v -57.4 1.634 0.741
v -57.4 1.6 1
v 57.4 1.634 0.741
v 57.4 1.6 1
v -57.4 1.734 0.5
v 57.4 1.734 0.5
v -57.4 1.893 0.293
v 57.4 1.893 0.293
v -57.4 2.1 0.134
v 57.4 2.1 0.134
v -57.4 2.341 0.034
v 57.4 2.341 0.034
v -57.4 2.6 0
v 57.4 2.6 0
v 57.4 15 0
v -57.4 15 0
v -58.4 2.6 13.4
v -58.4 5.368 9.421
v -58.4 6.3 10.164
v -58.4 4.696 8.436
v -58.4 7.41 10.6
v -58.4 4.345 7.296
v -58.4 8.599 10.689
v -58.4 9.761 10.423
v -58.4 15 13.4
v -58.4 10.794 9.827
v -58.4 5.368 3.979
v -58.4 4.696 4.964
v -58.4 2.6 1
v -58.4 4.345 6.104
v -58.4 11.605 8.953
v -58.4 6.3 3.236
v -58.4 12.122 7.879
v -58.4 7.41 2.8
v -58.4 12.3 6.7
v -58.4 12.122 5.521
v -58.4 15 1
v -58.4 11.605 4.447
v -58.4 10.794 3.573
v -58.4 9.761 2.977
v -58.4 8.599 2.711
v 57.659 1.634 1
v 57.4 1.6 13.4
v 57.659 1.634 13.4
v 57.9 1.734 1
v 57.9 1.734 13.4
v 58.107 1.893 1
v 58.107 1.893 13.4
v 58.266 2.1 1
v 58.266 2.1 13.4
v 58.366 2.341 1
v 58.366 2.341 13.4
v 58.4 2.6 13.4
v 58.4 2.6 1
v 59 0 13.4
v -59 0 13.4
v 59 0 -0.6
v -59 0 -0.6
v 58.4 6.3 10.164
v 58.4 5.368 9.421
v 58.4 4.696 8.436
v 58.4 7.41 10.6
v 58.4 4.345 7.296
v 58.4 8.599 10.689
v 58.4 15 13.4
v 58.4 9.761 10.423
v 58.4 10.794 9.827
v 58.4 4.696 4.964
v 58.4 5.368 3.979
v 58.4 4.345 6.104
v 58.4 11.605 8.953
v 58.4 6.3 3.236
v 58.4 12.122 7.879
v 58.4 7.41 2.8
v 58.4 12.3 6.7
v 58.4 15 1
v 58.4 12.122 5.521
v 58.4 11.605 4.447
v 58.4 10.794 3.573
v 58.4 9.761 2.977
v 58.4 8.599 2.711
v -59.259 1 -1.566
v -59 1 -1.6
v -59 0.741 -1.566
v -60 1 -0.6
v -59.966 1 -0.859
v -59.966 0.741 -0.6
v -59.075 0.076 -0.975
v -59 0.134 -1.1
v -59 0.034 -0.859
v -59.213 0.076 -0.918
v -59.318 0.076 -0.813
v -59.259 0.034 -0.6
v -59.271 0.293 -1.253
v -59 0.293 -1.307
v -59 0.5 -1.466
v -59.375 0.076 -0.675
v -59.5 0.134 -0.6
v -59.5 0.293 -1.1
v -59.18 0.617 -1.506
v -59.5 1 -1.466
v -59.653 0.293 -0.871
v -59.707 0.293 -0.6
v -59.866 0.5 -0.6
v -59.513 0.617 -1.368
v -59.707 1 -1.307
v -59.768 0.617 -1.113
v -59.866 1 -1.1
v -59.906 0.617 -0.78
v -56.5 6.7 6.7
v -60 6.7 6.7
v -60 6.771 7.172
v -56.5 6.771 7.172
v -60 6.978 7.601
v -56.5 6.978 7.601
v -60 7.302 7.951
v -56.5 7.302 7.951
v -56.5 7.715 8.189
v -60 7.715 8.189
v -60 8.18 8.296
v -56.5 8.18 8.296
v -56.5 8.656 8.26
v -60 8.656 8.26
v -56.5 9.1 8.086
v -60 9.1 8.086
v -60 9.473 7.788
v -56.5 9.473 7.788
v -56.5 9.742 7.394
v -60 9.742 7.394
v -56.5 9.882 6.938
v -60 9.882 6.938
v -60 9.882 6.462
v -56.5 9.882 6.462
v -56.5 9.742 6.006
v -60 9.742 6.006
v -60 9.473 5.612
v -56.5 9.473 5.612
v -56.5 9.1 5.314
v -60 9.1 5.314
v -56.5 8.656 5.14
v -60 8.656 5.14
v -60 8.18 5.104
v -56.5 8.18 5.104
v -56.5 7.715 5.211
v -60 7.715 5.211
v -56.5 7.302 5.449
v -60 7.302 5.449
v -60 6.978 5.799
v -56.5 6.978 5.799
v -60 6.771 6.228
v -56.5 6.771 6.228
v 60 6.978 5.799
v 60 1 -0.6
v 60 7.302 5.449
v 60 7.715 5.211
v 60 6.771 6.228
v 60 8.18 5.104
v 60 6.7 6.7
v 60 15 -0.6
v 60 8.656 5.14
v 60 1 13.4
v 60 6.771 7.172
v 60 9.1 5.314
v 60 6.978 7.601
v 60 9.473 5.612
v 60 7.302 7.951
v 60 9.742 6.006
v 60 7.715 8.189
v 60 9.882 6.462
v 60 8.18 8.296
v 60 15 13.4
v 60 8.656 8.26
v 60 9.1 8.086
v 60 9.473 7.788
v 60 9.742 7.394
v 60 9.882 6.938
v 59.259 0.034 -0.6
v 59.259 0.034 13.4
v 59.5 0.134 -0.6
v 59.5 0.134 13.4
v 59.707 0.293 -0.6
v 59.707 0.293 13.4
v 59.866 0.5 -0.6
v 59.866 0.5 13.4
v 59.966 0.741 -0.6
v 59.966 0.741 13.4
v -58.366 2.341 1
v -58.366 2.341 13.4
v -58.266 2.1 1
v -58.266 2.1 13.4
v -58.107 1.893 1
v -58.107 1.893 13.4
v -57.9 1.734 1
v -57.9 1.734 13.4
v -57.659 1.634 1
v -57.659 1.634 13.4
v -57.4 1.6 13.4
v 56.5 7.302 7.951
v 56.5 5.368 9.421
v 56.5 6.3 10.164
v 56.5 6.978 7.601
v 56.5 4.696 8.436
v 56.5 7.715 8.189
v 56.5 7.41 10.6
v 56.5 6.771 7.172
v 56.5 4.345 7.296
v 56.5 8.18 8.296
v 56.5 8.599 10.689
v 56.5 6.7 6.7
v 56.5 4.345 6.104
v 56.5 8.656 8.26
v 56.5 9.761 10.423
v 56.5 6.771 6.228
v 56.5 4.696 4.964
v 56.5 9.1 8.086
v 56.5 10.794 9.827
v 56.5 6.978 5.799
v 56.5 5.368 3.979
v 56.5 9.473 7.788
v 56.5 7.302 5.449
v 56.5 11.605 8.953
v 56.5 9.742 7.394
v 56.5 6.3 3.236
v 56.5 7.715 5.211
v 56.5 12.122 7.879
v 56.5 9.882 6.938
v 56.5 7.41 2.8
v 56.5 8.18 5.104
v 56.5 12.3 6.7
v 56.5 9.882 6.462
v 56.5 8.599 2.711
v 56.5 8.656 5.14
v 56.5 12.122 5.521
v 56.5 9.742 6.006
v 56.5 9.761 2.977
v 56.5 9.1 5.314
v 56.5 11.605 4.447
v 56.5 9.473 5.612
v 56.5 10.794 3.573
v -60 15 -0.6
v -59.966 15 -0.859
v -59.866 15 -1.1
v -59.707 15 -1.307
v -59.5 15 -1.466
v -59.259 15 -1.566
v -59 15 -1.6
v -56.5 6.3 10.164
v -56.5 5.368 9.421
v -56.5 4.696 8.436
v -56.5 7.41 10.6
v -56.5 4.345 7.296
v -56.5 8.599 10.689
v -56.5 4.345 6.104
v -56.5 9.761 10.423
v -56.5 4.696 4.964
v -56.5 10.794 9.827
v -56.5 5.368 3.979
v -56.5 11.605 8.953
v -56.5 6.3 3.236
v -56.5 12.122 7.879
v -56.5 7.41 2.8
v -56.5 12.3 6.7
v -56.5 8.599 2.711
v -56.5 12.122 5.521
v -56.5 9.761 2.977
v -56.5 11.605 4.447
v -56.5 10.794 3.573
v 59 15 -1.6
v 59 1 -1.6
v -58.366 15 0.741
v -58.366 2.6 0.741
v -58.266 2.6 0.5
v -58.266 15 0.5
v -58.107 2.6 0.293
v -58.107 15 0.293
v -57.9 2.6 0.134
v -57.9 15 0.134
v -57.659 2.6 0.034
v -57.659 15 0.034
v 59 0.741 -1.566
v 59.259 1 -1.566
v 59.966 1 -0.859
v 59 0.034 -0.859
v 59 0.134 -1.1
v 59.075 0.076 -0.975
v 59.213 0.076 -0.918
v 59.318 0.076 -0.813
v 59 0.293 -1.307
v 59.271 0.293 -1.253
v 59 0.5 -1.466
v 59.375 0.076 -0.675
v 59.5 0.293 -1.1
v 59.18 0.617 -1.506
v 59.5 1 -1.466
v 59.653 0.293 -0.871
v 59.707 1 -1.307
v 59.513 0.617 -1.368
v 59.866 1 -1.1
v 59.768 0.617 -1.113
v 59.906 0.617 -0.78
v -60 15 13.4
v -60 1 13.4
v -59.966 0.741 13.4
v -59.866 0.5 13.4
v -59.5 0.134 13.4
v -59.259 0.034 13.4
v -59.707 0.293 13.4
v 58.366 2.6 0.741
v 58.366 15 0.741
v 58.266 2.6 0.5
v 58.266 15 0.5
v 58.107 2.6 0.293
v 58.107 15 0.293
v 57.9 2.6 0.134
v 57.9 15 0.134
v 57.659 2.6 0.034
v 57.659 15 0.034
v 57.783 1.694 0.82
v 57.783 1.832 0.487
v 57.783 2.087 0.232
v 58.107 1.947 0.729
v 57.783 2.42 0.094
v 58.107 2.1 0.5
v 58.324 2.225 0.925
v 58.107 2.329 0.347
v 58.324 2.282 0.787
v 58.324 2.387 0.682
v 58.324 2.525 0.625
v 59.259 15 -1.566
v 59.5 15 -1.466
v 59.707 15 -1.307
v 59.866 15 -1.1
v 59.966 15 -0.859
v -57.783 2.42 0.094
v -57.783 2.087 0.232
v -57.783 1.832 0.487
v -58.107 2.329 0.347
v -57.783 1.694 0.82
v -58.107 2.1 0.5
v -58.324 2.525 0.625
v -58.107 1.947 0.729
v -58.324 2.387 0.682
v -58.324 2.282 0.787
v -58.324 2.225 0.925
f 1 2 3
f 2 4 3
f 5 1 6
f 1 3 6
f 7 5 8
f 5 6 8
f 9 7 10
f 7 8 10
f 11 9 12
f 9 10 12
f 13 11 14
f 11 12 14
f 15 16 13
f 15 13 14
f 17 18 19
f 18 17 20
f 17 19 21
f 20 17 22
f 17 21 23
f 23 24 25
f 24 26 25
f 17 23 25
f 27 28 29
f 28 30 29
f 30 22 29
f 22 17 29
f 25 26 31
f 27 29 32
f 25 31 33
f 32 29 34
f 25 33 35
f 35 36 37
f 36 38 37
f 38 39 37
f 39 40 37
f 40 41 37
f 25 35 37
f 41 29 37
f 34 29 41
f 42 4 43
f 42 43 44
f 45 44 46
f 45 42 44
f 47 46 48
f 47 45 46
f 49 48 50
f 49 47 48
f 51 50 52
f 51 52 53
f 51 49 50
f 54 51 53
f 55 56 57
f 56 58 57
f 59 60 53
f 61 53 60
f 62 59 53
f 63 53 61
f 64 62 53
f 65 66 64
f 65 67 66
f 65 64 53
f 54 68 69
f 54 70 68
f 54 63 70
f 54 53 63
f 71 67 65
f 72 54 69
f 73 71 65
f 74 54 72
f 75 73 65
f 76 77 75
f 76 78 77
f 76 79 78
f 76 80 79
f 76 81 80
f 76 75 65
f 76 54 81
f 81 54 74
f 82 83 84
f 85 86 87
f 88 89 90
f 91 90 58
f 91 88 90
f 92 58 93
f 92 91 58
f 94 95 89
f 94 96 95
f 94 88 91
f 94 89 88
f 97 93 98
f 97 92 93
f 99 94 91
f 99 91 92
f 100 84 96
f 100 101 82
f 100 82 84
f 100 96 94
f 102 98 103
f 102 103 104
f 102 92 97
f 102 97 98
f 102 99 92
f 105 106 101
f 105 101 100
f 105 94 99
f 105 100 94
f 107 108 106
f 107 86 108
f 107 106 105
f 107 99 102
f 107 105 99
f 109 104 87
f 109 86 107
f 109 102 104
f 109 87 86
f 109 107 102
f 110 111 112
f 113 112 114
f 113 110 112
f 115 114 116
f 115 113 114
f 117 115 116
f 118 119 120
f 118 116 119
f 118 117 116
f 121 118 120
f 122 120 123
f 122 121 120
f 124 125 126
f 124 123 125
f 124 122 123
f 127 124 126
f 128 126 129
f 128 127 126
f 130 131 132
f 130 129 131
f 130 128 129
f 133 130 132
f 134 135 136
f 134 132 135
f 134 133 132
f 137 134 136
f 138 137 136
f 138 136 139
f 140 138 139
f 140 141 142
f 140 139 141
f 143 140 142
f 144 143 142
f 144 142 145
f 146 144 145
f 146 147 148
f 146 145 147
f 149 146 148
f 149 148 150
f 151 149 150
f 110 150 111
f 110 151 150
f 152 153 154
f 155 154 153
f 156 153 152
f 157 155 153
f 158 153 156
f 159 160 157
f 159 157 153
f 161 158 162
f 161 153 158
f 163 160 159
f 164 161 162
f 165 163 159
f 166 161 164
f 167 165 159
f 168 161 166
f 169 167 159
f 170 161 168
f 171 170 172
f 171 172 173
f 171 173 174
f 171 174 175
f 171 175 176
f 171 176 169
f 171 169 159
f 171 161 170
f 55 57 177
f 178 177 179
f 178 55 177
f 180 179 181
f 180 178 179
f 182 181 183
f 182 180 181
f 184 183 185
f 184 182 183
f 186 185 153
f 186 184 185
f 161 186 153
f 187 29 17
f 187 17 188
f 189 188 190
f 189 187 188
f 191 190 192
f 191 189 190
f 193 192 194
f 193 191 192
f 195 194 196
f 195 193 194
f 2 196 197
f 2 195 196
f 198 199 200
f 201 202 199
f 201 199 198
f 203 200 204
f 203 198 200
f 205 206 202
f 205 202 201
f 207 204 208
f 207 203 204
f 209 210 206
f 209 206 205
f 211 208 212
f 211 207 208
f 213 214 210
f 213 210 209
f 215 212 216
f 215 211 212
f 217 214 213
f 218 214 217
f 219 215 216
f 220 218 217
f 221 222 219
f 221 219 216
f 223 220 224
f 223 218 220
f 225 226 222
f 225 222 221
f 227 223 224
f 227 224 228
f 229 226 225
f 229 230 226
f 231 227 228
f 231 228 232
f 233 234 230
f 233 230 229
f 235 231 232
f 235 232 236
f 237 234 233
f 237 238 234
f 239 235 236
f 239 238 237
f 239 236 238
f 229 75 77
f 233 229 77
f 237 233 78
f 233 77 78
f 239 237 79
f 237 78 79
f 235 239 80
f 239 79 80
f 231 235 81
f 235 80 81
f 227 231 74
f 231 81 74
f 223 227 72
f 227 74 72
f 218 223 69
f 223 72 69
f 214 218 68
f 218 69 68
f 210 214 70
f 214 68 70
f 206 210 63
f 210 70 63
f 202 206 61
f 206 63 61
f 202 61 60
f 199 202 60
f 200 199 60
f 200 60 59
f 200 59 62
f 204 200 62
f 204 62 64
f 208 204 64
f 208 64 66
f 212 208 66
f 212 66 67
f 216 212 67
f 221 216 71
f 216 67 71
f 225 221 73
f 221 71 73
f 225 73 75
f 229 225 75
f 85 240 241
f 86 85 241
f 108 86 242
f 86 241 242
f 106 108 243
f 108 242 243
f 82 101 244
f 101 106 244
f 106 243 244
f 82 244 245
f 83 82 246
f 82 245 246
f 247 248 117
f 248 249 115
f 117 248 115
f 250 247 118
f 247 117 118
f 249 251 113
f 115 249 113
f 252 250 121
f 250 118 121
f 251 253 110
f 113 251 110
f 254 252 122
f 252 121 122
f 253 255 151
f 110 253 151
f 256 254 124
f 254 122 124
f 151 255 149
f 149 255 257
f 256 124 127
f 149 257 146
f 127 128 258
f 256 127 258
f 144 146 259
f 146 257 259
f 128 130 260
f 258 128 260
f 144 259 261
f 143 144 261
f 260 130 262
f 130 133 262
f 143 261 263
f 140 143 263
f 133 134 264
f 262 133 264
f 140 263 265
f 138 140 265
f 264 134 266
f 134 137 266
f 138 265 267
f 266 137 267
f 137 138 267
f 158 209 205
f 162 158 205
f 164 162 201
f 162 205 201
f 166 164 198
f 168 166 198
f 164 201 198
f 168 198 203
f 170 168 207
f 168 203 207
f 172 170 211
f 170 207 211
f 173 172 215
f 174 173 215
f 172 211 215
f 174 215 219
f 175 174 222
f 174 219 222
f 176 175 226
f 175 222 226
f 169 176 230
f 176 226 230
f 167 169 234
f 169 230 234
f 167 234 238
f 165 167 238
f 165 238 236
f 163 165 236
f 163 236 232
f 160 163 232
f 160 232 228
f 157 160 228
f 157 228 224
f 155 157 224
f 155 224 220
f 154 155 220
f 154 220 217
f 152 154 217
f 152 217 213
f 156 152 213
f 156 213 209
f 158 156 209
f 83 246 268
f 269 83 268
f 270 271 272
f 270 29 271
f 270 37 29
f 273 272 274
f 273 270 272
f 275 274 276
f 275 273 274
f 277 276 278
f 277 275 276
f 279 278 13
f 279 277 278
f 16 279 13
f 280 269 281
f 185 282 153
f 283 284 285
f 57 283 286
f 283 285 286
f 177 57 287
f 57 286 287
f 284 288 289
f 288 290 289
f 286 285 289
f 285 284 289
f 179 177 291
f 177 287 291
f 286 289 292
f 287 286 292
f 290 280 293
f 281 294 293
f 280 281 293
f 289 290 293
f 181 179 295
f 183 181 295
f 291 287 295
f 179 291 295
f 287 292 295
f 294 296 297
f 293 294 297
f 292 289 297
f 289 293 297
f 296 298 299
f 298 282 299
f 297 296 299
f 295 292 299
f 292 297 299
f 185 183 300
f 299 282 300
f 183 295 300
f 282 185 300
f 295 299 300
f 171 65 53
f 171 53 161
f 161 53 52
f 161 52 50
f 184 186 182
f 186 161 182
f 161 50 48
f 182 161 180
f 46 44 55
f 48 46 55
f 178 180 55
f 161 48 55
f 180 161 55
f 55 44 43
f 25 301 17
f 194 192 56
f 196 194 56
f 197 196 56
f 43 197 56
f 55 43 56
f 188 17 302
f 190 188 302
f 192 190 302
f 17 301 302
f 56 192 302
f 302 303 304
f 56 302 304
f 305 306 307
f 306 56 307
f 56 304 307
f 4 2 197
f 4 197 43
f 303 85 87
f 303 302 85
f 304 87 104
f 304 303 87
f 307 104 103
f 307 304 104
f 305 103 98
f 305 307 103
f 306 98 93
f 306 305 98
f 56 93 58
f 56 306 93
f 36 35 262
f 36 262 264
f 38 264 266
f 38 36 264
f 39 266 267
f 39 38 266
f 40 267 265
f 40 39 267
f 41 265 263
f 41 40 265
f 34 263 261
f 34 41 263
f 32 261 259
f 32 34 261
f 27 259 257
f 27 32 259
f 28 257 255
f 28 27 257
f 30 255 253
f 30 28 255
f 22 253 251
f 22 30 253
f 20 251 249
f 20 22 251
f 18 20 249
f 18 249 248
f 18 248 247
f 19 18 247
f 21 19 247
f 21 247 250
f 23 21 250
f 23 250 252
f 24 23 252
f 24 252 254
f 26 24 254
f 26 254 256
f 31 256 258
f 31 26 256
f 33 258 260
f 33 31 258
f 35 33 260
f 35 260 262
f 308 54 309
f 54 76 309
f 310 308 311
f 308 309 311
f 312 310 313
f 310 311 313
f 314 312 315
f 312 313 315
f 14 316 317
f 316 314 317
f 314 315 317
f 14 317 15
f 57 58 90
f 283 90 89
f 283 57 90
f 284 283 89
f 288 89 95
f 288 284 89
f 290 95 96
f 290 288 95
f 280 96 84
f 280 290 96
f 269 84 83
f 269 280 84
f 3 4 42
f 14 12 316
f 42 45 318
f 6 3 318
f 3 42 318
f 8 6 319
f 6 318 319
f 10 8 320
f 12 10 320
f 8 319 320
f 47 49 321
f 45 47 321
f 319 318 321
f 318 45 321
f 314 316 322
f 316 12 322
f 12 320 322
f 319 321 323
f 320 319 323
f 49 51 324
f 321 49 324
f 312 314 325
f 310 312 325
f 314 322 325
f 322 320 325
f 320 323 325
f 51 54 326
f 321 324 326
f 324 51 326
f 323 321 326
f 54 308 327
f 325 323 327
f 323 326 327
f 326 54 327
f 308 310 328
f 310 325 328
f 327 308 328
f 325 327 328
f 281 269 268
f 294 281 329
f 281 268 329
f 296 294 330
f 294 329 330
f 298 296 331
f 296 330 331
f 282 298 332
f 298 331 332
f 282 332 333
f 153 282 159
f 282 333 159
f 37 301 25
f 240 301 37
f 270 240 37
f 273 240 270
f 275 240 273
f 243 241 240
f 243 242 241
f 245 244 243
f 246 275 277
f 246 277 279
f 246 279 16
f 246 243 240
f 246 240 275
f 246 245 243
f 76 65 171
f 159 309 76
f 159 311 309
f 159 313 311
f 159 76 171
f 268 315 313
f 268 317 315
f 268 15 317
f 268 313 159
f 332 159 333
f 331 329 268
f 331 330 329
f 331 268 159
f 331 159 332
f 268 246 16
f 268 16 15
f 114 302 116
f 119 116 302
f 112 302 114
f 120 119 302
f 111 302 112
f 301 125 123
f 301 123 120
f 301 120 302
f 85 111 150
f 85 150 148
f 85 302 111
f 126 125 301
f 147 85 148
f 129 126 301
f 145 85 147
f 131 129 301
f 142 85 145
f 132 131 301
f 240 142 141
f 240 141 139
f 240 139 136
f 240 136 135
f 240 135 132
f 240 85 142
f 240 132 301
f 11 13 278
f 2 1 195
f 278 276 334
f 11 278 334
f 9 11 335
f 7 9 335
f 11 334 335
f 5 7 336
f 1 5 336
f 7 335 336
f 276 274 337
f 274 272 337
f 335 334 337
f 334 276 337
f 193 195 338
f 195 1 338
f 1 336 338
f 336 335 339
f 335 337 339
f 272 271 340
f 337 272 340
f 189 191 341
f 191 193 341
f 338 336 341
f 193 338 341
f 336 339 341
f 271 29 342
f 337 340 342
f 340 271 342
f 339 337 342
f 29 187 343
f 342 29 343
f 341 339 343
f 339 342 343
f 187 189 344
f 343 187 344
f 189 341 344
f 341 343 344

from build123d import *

# Parameters (mm, degrees)
SKETCH_1_W             = 120
SKETCH_1_H             = 15
SM_BASE_FLANGE_1_DEPTH = 1.6
EXTRUDE_1_OUTLINE_W    = 116.8
EXTRUDE_1_OUTLINE_H    = 1.6
EXTRUDE_1_DEPTH        = 13.4
SKETCH_37_5_W          = 1.6
SKETCH_37_5_H          = 15
EXTRUDE_2_DEPTH        = 13.4
SKETCH_45_R            = 4
EXTRUDE_4_DEPTH        = 1.9
SKETCH_46_R            = 1.6
CUT_EXTRUDE_2_DEPTH    = 119.223559412
FILLET_3_R             = 1
FILLET_4_R             = 1


# Read off the part's stored shape, not the designer's step: 拉伸-薄壁1
# Sheet-metal steps are written as plain solids
with BuildPart() as part:
    # Sketch 1 → 基体-法兰1 (new body)
    with BuildSketch(Plane.XY):
        with Locations((0, 7.5)):
            Rectangle(SKETCH_1_W, SKETCH_1_H)
    extrude(amount=-SM_BASE_FLANGE_1_DEPTH)

    # 拉伸-薄壁1 outline → 拉伸-薄壁1 (add)
    with BuildSketch(Plane.XY):
        with Locations((0, 0.8)):
            Rectangle(EXTRUDE_1_OUTLINE_W, EXTRUDE_1_OUTLINE_H)
    extrude(amount=EXTRUDE_1_DEPTH)

    # 草图37<5> → 凸台-拉伸2 (add)
    with BuildSketch(Plane.XY):
        with Locations((-59.2, 7.5)):
            Rectangle(SKETCH_37_5_W, SKETCH_37_5_H)
        with Locations((59.2, 7.5)):
            Rectangle(SKETCH_37_5_W, SKETCH_37_5_H)
    extrude(amount=EXTRUDE_2_DEPTH)

    # 草图45 → 凸台-拉伸4 (add)
    with BuildSketch(Plane.ZY.offset(-58.4)):
        with Locations(Location((6.7, 8.3, 0), (0, 0, 90))):
            Circle(SKETCH_45_R)
    extrude_4 = extrude(amount=EXTRUDE_4_DEPTH)

    # 镜向1: 凸台-拉伸4 across plane
    add(extrude_4.mirror(Plane(origin=(0, 0, 0), x_dir=(0, 0, 1), z_dir=(1, 0, 0))))

    # 草图46 → 切除-拉伸2 (cut, through all)
    with BuildSketch(Plane.ZY.offset(-56.5)):
        with Locations(Location((6.7, 8.3, 0), (0, 0, 270))):
            Circle(SKETCH_46_R)
    cut_extrude_2 = extrude(amount=-CUT_EXTRUDE_2_DEPTH, mode=Mode.SUBTRACT)

    # 镜向2: 切除-拉伸2 across plane
    add(cut_extrude_2.mirror(Plane(origin=(0, 0, 0), x_dir=(0, 0, 1), z_dir=(1, 0, 0))), mode=Mode.SUBTRACT)

    # 圆角3
    fillet_3_edges = [part.edges().sort_by_distance(p)[0] for p in [
        (60, 7.5, -1.6),
        (0, 1.6, 0),
        (58.4, 8.3, 0),
        (-60, 7.5, -1.6),
        (-58.4, 8.3, 0),
        (0, 0, -1.6),
        (60, 0, 5.9),
        (-60, 0, 5.9),
    ]]
    fillet(fillet_3_edges, radius=FILLET_3_R)

    # 圆角4
    # the kernel refuses this fillet: 1 mm, written as the material it adds along each edge
    with BuildSketch(Plane(origin=(-57.4, 2.6, 1), x_dir=(0, -1, 0), z_dir=(-1, 0, 0))) as fillet_4_piece_1_section:
        Polygon((0, 0), (FILLET_4_R, 0), (FILLET_4_R, -FILLET_4_R), (0, -FILLET_4_R), align=None)
    fillet_4_piece_1 = extrude(amount=FILLET_4_R, mode=Mode.PRIVATE)
    fillet_4_piece_1 = fillet_4_piece_1 - Plane(origin=(-57.4, 2.6, 1), x_dir=(0, 0.7071067811865475, 0.7071067811865475), z_dir=(-1, 0, 0)) * Sphere(FILLET_4_R, mode=Mode.PRIVATE)
    add(fillet_4_piece_1)
    with BuildSketch(Plane(origin=(57.4, 2.6, 1), x_dir=(0, -1, 0), z_dir=(1, 0, 0))) as fillet_4_piece_2_section:
        Polygon((0, 0), (FILLET_4_R, 0), (FILLET_4_R, FILLET_4_R), (0, FILLET_4_R), align=None)
    fillet_4_piece_2 = extrude(amount=FILLET_4_R, mode=Mode.PRIVATE)
    fillet_4_piece_2 = fillet_4_piece_2 - Plane(origin=(57.4, 2.6, 1), x_dir=(0, 0.7071067811865475, 0.7071067811865475), z_dir=(1, 0, 0)) * Sphere(FILLET_4_R, mode=Mode.PRIVATE)
    add(fillet_4_piece_2)
    with BuildSketch(Plane(origin=(58.4, 1.6, 1), x_dir=(0, 1, 0), z_dir=(0, 0, 1))) as fillet_4_piece_3:
        with BuildLine():
            CenterArc((FILLET_4_R, FILLET_4_R), FILLET_4_R, 180, 90)
            Line((0, FILLET_4_R), (0, 0))
            Line((0, 0), (FILLET_4_R, 0))
        make_face()
    extrude(amount=12.4)
    with BuildSketch(Plane(origin=(-58.4, 1.6, 1), x_dir=(0, 1, 0), z_dir=(0, 0, 1))) as fillet_4_piece_4:
        with BuildLine():
            CenterArc((FILLET_4_R, -FILLET_4_R), FILLET_4_R, 90, 90)
            Line((0, -FILLET_4_R), (0, 0))
            Line((0, 0), (FILLET_4_R, 0))
        make_face()
    extrude(amount=12.4)


solid = part.part
